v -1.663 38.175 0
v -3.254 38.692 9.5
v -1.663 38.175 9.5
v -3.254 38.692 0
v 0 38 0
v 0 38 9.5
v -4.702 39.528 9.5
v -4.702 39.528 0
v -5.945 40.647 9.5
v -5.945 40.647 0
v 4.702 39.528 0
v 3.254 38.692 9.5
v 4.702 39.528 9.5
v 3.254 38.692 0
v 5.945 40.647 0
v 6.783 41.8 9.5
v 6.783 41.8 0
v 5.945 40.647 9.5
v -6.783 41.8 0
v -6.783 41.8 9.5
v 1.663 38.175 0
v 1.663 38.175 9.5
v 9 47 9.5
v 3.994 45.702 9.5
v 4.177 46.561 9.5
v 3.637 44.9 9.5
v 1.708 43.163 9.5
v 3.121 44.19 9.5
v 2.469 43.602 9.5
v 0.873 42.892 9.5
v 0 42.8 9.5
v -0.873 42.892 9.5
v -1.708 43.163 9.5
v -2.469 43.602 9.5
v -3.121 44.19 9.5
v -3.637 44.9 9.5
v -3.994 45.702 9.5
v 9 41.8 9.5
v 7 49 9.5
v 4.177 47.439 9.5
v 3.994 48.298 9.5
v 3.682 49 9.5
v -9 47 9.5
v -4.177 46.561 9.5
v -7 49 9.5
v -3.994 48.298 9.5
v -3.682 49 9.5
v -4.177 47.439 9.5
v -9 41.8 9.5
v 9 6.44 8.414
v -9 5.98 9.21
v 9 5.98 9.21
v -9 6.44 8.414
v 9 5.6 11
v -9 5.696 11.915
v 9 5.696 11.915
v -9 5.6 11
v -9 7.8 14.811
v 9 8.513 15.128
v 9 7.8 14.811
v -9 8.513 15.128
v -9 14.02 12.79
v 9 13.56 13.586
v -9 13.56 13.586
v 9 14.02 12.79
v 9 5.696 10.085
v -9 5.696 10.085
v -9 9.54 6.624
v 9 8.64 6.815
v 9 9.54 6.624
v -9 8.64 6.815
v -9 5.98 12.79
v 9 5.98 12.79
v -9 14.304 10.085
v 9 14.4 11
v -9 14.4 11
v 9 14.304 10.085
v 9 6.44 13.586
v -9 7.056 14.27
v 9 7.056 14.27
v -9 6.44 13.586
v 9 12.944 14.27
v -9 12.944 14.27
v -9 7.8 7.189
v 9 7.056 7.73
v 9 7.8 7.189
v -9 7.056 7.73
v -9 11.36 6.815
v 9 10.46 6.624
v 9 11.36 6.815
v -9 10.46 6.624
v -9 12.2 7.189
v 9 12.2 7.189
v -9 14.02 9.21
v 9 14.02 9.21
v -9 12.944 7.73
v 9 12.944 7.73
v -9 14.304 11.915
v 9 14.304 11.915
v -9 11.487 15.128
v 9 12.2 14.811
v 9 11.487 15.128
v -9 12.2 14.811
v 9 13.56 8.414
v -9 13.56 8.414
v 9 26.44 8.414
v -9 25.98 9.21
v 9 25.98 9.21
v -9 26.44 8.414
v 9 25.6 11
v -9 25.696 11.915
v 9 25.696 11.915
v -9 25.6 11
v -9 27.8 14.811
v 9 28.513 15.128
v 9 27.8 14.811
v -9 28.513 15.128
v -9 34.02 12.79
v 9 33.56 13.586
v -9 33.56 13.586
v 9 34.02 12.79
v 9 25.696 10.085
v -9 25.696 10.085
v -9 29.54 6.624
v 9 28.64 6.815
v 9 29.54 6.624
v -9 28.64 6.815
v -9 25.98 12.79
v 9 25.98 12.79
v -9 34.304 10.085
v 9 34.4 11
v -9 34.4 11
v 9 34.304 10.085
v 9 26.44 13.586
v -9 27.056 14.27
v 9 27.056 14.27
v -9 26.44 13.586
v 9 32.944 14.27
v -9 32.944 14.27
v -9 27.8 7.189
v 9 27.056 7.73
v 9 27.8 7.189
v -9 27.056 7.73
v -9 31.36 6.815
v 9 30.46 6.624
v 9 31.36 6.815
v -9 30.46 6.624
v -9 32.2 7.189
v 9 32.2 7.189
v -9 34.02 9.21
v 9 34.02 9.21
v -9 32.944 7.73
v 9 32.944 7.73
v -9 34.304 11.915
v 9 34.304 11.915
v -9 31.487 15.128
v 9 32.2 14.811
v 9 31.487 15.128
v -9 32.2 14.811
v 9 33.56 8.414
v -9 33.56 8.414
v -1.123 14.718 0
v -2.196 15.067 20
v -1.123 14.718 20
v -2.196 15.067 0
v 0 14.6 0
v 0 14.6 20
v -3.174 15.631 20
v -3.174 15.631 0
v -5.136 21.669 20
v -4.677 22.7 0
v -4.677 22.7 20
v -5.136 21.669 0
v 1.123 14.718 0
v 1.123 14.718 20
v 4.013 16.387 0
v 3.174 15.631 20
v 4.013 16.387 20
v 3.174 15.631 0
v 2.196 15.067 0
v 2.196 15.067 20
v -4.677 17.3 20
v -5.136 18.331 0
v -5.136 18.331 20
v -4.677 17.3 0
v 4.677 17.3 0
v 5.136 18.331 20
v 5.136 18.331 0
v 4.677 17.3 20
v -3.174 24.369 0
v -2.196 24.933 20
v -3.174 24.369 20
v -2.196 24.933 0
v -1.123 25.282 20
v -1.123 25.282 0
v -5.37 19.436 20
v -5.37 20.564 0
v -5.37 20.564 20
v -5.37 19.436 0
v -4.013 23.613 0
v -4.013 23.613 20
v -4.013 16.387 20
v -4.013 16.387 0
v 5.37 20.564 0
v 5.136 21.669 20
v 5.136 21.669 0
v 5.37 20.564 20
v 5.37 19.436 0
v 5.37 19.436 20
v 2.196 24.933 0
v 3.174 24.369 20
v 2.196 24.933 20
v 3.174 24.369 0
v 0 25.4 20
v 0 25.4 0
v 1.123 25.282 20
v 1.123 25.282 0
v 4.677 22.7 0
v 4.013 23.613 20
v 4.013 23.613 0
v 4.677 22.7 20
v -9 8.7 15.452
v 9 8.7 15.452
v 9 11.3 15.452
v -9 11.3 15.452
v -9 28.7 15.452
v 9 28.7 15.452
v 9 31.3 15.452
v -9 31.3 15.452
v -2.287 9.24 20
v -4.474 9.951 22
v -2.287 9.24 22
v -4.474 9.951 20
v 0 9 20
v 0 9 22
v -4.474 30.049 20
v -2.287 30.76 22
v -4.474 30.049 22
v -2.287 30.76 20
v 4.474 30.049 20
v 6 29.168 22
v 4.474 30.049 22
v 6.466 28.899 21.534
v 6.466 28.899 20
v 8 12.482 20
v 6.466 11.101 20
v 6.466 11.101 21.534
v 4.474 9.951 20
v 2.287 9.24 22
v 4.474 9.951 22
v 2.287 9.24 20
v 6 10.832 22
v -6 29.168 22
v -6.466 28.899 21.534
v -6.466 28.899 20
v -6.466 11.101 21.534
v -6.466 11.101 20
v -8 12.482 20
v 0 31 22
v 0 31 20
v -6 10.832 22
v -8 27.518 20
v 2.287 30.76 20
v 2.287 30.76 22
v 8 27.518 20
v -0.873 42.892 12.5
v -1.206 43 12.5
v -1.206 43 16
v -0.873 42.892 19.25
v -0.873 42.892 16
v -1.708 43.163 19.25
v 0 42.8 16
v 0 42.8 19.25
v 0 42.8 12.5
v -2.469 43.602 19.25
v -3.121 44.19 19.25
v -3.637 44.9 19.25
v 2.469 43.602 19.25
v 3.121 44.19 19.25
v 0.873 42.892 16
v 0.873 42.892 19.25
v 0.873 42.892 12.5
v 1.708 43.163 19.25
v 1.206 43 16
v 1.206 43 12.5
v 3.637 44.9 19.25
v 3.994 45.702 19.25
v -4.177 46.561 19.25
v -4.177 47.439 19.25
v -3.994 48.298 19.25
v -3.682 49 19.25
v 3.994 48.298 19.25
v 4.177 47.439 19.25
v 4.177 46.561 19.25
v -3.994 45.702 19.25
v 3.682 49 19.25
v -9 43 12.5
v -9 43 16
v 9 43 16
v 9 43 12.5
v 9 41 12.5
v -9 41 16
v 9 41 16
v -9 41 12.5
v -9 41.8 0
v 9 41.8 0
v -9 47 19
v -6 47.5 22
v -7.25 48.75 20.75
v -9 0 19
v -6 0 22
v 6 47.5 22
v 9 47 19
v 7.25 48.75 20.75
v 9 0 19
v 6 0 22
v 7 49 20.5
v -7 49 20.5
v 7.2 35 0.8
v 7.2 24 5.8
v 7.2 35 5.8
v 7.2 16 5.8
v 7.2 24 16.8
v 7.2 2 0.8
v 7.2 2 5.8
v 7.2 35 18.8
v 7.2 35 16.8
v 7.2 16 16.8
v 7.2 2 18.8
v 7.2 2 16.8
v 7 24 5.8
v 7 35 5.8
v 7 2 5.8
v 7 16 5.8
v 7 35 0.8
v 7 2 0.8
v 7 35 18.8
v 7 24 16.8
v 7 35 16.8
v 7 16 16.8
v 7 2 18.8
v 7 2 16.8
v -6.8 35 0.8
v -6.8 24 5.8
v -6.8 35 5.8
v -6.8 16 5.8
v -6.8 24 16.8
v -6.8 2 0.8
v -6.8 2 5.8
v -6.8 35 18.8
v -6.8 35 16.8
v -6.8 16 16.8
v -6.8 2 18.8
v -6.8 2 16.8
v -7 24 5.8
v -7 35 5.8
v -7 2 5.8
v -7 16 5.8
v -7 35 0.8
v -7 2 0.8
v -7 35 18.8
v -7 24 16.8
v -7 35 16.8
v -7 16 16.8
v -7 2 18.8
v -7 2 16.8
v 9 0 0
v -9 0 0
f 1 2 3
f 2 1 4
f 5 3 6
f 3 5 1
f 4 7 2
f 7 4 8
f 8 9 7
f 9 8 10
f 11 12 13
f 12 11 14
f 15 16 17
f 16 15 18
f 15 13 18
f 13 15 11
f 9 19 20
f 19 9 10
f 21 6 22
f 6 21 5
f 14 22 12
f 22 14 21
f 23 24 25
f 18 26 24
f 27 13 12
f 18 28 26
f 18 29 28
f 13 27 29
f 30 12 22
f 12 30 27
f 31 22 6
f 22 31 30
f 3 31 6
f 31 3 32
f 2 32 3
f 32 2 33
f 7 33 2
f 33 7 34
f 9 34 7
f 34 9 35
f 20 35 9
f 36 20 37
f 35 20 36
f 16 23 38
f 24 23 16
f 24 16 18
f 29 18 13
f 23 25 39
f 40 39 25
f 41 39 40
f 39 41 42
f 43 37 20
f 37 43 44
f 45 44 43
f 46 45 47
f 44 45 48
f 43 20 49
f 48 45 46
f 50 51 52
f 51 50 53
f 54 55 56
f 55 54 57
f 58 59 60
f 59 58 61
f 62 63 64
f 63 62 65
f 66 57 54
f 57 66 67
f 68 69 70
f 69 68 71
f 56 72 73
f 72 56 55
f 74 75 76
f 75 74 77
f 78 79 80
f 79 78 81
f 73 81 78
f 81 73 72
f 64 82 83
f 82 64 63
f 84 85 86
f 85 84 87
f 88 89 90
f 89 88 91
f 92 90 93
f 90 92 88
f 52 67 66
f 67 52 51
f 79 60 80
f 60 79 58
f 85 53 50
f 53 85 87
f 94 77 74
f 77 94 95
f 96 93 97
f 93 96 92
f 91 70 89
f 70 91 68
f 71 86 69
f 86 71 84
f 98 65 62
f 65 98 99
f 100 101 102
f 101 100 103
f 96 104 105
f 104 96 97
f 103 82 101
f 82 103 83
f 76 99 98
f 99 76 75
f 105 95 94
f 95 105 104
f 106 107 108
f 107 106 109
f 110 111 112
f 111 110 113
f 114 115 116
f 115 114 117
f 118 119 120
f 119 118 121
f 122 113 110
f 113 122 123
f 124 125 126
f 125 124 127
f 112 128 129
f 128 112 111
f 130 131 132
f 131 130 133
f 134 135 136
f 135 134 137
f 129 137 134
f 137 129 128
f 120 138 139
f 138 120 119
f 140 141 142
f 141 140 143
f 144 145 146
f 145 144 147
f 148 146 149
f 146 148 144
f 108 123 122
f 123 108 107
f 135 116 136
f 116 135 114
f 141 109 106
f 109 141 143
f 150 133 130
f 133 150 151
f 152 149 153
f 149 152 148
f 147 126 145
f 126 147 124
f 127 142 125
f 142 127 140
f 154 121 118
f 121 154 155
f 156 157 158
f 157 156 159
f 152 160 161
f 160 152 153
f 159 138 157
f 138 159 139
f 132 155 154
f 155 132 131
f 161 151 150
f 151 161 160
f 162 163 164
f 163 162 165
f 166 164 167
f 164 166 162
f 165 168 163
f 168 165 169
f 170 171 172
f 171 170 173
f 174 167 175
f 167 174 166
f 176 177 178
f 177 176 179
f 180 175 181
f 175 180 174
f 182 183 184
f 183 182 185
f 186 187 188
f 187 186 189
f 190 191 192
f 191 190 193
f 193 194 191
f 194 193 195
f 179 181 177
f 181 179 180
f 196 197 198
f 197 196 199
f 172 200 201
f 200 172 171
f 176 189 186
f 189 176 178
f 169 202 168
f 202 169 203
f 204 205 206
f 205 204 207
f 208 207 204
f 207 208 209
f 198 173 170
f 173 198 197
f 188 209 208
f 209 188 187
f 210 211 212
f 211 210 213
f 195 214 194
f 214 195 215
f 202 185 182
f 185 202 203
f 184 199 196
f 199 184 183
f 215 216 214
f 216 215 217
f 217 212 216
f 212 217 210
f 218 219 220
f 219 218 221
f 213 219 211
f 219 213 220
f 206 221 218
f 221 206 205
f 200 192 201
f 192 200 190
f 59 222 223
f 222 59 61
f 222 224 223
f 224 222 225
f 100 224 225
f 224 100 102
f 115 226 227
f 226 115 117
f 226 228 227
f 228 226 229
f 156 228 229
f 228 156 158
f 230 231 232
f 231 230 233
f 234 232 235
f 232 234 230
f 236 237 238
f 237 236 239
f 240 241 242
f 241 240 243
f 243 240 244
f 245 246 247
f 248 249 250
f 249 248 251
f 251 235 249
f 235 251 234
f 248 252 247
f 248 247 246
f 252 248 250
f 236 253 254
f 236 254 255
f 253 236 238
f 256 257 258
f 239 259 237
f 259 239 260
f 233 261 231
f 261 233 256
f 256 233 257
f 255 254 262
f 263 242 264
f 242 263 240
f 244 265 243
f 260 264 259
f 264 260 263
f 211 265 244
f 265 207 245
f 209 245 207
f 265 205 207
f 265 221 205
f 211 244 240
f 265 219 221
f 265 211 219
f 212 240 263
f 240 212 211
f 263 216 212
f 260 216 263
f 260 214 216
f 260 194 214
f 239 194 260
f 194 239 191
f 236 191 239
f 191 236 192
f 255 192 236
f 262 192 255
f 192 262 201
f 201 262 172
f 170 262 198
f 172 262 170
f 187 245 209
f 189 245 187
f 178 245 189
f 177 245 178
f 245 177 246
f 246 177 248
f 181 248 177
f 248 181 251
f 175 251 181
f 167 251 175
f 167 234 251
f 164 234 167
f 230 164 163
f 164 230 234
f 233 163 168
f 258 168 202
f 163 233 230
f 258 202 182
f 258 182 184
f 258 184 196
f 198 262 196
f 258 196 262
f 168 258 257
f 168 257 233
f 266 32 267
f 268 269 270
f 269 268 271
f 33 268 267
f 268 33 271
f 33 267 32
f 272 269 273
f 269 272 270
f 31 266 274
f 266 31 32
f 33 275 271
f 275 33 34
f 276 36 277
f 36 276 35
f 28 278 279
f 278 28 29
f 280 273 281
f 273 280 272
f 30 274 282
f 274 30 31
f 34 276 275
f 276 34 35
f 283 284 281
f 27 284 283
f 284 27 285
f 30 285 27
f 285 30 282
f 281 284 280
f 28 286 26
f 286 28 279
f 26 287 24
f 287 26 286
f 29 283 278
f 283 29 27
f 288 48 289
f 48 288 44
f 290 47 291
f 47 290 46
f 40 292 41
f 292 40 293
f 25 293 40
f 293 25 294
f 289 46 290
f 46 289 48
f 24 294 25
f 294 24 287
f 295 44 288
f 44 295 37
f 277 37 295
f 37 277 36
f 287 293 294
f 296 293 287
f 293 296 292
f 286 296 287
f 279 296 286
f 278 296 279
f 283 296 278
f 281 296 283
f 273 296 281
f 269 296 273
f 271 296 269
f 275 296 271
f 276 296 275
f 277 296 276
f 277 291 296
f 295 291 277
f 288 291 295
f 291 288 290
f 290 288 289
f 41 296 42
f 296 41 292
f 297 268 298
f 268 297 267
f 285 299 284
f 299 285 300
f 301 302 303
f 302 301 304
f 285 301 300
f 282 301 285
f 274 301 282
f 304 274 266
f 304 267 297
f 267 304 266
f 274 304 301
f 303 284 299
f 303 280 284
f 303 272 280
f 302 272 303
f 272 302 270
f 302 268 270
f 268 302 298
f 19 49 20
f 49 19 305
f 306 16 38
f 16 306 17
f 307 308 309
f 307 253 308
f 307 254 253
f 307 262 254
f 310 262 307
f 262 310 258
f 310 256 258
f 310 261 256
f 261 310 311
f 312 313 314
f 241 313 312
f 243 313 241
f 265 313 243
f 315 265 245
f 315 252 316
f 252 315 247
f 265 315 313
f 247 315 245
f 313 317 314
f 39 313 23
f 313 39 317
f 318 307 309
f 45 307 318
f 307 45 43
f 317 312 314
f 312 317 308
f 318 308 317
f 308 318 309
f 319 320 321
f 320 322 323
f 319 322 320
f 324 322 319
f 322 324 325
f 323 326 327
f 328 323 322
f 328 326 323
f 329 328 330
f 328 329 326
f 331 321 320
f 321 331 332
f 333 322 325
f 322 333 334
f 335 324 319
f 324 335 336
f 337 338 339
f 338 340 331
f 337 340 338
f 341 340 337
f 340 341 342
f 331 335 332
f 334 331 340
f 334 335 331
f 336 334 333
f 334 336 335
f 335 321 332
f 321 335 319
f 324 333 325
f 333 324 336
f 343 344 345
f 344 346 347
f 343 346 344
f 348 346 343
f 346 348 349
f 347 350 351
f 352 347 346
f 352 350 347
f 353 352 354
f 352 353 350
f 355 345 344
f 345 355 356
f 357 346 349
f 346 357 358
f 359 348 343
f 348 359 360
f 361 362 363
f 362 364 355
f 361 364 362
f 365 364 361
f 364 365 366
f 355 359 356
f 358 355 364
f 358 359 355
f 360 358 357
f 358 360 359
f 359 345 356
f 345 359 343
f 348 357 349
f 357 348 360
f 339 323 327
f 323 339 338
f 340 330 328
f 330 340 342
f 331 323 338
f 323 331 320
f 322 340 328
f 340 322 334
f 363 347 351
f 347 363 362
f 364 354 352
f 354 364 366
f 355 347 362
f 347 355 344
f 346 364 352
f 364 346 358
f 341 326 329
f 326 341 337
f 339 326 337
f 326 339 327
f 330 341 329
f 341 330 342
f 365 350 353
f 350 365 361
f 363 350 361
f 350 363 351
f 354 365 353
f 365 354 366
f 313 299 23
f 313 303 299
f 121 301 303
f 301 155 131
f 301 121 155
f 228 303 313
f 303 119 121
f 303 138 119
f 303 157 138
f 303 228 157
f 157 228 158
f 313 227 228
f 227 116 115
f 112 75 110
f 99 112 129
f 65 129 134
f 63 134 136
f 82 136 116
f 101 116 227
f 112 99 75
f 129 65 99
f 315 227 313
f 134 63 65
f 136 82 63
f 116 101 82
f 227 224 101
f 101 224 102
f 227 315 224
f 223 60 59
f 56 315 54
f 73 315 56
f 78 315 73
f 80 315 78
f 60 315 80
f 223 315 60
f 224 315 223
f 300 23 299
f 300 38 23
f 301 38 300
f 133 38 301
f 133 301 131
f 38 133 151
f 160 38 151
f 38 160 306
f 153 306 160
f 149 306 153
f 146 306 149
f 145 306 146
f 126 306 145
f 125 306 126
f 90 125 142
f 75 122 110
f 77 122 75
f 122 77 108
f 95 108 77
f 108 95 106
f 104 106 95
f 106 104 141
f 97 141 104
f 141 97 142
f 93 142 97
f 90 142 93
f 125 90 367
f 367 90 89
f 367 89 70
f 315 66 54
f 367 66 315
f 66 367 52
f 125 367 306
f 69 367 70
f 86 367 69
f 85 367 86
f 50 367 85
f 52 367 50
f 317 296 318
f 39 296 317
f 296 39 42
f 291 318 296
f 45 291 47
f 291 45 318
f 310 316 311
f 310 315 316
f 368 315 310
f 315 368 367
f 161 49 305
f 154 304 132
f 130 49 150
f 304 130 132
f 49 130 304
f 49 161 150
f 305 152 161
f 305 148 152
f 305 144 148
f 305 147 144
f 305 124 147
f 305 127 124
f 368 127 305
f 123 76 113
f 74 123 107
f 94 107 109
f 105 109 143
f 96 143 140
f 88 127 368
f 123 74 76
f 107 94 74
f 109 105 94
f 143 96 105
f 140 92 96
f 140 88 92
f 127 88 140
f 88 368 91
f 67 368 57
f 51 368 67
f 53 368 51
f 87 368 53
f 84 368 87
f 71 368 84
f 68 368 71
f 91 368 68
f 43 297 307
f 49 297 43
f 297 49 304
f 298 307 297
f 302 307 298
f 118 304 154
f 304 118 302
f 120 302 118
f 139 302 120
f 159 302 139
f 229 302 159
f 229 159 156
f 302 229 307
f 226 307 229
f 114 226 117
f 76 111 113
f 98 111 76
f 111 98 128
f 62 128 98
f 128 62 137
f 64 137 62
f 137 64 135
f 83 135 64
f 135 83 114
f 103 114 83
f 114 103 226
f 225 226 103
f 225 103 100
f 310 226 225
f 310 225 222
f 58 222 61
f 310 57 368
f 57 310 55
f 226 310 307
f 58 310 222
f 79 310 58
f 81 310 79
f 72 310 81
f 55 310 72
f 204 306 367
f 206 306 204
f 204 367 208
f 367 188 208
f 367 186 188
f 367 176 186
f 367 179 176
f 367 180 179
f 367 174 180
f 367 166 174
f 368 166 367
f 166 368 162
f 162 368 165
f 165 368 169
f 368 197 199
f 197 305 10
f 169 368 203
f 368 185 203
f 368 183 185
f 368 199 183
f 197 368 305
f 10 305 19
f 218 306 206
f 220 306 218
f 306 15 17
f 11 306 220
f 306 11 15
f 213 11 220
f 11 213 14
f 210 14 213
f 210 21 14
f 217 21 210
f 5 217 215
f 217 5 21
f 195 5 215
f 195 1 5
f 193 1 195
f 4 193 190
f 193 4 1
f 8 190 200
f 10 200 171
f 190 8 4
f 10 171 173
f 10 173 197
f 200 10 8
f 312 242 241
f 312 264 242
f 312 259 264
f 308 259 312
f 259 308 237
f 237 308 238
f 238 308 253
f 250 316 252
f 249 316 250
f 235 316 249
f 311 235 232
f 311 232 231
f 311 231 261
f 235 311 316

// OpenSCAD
// PRUSA iteration3
// Y frame corners
// GNU GPL v3
// Josef Průša <iam@josefprusa.cz> and contributors
// http://www.reprap.org/wiki/Prusa_Mendel
// http://prusamendel.org


module corner_base(){
    translate([-9,-11,0]) cube([18,22,49]);
}

module corner_holes(){
    translate([-11,-11,0]){
        // Bottom hole
        translate([0,11,10])rotate([0,90,0]) translate([0,0,-5]) cylinder(h=270,r=4.4,$fn=30);

        // Top hole
        translate([0,11,30])rotate([0,90,0]) translate([0,0,-5]) cylinder(h=270,r=4.4,$fn=30);

        // Middle hole
        translate([11,0,20])rotate([0,0,90]) rotate([0,90,0]) translate([0,0,-5]) cylinder(h=270,r=5.4,$fn=30);

        // Bottom hole bridge
        translate([0,8.8,10])rotate([0,90,0]) translate([0,0,-5]) cylinder(h=270,r=2.6,$fn=6);

        // Top hole bridge
        translate([0,8.8,30])rotate([0,90,0]) translate([0,0,-5]) cylinder(h=270,r=2.6,$fn=6);

        // Washer hole
        translate([11,-3,20])rotate([0,0,90]) rotate([0,90,0]) translate([0,0,-5]) cylinder(h=10,r=11,$fn=30);

        // Top smooth rod insert
        // Smooth rod place
        translate([11,2.75,47]) rotate([0,90,90]) cylinder(h=10,r=4.2,$fn=30);
        // Ziptie
        translate([-5,6,41]) cube([30,3.5,2]);

        // LM8UU keepout
        difference(){
            translate([11,12.5,46]) rotate([0,90,90]) cylinder(h=270,r=8,$fn=30);
            translate([21,12.5,62]) rotate([0,90,90]) cube([20,20,30]);
        }
        translate([21,12.5,57]) rotate([0,90,90]) cube([15.2,20,20]);
    }
}

module corner_fancy(){
    // Side corner cutouts
    translate([-8,-9,0]) rotate([0,0,-45-180]) translate([-15,0,-1]) cube([30,30,51]);
    translate([8,-9,0]) rotate([0,0,45-180]) translate([-15,0,-1]) cube([30,30,51]);

    // Top corner cutouts
    translate([7,0,49]) rotate([0,45,0]) translate([-15,-15,0]) cube([30,30,30]);
    translate([-7,0,49]) rotate([0,-45,0]) translate([-15,-15,0]) cube([30,30,30]);
    rotate([0,0,90]) translate([-9.5,0,49]) rotate([0,-45,0]) translate([-15,-15,0]) cube([30,30,30]);
}

module selective_infill(){

    translate([7,2,0.8]) cube([0.2,33,5]);
    translate([-7,2,0.8]) cube([0.2,33,5]);

    translate([ 7,16,5.8]) cube([0.2,8,11]);
    translate([-7,16,5.8]) cube([0.2,8,11]);

    translate([7,2,16.8]) cube([0.2,33,2]);
    translate([-7,2,16.8]) cube([0.2,33,2]);
}


// Final part
module corner(){
    // Rotate the part for better printing
    translate([0,0,11]) rotate([-90,0,0]){
        difference(){
            corner_base();
            corner_holes();
            corner_fancy();
            translate([0,11,0]) rotate([90,0,0])selective_infill();
        }
    }

}

corner();
